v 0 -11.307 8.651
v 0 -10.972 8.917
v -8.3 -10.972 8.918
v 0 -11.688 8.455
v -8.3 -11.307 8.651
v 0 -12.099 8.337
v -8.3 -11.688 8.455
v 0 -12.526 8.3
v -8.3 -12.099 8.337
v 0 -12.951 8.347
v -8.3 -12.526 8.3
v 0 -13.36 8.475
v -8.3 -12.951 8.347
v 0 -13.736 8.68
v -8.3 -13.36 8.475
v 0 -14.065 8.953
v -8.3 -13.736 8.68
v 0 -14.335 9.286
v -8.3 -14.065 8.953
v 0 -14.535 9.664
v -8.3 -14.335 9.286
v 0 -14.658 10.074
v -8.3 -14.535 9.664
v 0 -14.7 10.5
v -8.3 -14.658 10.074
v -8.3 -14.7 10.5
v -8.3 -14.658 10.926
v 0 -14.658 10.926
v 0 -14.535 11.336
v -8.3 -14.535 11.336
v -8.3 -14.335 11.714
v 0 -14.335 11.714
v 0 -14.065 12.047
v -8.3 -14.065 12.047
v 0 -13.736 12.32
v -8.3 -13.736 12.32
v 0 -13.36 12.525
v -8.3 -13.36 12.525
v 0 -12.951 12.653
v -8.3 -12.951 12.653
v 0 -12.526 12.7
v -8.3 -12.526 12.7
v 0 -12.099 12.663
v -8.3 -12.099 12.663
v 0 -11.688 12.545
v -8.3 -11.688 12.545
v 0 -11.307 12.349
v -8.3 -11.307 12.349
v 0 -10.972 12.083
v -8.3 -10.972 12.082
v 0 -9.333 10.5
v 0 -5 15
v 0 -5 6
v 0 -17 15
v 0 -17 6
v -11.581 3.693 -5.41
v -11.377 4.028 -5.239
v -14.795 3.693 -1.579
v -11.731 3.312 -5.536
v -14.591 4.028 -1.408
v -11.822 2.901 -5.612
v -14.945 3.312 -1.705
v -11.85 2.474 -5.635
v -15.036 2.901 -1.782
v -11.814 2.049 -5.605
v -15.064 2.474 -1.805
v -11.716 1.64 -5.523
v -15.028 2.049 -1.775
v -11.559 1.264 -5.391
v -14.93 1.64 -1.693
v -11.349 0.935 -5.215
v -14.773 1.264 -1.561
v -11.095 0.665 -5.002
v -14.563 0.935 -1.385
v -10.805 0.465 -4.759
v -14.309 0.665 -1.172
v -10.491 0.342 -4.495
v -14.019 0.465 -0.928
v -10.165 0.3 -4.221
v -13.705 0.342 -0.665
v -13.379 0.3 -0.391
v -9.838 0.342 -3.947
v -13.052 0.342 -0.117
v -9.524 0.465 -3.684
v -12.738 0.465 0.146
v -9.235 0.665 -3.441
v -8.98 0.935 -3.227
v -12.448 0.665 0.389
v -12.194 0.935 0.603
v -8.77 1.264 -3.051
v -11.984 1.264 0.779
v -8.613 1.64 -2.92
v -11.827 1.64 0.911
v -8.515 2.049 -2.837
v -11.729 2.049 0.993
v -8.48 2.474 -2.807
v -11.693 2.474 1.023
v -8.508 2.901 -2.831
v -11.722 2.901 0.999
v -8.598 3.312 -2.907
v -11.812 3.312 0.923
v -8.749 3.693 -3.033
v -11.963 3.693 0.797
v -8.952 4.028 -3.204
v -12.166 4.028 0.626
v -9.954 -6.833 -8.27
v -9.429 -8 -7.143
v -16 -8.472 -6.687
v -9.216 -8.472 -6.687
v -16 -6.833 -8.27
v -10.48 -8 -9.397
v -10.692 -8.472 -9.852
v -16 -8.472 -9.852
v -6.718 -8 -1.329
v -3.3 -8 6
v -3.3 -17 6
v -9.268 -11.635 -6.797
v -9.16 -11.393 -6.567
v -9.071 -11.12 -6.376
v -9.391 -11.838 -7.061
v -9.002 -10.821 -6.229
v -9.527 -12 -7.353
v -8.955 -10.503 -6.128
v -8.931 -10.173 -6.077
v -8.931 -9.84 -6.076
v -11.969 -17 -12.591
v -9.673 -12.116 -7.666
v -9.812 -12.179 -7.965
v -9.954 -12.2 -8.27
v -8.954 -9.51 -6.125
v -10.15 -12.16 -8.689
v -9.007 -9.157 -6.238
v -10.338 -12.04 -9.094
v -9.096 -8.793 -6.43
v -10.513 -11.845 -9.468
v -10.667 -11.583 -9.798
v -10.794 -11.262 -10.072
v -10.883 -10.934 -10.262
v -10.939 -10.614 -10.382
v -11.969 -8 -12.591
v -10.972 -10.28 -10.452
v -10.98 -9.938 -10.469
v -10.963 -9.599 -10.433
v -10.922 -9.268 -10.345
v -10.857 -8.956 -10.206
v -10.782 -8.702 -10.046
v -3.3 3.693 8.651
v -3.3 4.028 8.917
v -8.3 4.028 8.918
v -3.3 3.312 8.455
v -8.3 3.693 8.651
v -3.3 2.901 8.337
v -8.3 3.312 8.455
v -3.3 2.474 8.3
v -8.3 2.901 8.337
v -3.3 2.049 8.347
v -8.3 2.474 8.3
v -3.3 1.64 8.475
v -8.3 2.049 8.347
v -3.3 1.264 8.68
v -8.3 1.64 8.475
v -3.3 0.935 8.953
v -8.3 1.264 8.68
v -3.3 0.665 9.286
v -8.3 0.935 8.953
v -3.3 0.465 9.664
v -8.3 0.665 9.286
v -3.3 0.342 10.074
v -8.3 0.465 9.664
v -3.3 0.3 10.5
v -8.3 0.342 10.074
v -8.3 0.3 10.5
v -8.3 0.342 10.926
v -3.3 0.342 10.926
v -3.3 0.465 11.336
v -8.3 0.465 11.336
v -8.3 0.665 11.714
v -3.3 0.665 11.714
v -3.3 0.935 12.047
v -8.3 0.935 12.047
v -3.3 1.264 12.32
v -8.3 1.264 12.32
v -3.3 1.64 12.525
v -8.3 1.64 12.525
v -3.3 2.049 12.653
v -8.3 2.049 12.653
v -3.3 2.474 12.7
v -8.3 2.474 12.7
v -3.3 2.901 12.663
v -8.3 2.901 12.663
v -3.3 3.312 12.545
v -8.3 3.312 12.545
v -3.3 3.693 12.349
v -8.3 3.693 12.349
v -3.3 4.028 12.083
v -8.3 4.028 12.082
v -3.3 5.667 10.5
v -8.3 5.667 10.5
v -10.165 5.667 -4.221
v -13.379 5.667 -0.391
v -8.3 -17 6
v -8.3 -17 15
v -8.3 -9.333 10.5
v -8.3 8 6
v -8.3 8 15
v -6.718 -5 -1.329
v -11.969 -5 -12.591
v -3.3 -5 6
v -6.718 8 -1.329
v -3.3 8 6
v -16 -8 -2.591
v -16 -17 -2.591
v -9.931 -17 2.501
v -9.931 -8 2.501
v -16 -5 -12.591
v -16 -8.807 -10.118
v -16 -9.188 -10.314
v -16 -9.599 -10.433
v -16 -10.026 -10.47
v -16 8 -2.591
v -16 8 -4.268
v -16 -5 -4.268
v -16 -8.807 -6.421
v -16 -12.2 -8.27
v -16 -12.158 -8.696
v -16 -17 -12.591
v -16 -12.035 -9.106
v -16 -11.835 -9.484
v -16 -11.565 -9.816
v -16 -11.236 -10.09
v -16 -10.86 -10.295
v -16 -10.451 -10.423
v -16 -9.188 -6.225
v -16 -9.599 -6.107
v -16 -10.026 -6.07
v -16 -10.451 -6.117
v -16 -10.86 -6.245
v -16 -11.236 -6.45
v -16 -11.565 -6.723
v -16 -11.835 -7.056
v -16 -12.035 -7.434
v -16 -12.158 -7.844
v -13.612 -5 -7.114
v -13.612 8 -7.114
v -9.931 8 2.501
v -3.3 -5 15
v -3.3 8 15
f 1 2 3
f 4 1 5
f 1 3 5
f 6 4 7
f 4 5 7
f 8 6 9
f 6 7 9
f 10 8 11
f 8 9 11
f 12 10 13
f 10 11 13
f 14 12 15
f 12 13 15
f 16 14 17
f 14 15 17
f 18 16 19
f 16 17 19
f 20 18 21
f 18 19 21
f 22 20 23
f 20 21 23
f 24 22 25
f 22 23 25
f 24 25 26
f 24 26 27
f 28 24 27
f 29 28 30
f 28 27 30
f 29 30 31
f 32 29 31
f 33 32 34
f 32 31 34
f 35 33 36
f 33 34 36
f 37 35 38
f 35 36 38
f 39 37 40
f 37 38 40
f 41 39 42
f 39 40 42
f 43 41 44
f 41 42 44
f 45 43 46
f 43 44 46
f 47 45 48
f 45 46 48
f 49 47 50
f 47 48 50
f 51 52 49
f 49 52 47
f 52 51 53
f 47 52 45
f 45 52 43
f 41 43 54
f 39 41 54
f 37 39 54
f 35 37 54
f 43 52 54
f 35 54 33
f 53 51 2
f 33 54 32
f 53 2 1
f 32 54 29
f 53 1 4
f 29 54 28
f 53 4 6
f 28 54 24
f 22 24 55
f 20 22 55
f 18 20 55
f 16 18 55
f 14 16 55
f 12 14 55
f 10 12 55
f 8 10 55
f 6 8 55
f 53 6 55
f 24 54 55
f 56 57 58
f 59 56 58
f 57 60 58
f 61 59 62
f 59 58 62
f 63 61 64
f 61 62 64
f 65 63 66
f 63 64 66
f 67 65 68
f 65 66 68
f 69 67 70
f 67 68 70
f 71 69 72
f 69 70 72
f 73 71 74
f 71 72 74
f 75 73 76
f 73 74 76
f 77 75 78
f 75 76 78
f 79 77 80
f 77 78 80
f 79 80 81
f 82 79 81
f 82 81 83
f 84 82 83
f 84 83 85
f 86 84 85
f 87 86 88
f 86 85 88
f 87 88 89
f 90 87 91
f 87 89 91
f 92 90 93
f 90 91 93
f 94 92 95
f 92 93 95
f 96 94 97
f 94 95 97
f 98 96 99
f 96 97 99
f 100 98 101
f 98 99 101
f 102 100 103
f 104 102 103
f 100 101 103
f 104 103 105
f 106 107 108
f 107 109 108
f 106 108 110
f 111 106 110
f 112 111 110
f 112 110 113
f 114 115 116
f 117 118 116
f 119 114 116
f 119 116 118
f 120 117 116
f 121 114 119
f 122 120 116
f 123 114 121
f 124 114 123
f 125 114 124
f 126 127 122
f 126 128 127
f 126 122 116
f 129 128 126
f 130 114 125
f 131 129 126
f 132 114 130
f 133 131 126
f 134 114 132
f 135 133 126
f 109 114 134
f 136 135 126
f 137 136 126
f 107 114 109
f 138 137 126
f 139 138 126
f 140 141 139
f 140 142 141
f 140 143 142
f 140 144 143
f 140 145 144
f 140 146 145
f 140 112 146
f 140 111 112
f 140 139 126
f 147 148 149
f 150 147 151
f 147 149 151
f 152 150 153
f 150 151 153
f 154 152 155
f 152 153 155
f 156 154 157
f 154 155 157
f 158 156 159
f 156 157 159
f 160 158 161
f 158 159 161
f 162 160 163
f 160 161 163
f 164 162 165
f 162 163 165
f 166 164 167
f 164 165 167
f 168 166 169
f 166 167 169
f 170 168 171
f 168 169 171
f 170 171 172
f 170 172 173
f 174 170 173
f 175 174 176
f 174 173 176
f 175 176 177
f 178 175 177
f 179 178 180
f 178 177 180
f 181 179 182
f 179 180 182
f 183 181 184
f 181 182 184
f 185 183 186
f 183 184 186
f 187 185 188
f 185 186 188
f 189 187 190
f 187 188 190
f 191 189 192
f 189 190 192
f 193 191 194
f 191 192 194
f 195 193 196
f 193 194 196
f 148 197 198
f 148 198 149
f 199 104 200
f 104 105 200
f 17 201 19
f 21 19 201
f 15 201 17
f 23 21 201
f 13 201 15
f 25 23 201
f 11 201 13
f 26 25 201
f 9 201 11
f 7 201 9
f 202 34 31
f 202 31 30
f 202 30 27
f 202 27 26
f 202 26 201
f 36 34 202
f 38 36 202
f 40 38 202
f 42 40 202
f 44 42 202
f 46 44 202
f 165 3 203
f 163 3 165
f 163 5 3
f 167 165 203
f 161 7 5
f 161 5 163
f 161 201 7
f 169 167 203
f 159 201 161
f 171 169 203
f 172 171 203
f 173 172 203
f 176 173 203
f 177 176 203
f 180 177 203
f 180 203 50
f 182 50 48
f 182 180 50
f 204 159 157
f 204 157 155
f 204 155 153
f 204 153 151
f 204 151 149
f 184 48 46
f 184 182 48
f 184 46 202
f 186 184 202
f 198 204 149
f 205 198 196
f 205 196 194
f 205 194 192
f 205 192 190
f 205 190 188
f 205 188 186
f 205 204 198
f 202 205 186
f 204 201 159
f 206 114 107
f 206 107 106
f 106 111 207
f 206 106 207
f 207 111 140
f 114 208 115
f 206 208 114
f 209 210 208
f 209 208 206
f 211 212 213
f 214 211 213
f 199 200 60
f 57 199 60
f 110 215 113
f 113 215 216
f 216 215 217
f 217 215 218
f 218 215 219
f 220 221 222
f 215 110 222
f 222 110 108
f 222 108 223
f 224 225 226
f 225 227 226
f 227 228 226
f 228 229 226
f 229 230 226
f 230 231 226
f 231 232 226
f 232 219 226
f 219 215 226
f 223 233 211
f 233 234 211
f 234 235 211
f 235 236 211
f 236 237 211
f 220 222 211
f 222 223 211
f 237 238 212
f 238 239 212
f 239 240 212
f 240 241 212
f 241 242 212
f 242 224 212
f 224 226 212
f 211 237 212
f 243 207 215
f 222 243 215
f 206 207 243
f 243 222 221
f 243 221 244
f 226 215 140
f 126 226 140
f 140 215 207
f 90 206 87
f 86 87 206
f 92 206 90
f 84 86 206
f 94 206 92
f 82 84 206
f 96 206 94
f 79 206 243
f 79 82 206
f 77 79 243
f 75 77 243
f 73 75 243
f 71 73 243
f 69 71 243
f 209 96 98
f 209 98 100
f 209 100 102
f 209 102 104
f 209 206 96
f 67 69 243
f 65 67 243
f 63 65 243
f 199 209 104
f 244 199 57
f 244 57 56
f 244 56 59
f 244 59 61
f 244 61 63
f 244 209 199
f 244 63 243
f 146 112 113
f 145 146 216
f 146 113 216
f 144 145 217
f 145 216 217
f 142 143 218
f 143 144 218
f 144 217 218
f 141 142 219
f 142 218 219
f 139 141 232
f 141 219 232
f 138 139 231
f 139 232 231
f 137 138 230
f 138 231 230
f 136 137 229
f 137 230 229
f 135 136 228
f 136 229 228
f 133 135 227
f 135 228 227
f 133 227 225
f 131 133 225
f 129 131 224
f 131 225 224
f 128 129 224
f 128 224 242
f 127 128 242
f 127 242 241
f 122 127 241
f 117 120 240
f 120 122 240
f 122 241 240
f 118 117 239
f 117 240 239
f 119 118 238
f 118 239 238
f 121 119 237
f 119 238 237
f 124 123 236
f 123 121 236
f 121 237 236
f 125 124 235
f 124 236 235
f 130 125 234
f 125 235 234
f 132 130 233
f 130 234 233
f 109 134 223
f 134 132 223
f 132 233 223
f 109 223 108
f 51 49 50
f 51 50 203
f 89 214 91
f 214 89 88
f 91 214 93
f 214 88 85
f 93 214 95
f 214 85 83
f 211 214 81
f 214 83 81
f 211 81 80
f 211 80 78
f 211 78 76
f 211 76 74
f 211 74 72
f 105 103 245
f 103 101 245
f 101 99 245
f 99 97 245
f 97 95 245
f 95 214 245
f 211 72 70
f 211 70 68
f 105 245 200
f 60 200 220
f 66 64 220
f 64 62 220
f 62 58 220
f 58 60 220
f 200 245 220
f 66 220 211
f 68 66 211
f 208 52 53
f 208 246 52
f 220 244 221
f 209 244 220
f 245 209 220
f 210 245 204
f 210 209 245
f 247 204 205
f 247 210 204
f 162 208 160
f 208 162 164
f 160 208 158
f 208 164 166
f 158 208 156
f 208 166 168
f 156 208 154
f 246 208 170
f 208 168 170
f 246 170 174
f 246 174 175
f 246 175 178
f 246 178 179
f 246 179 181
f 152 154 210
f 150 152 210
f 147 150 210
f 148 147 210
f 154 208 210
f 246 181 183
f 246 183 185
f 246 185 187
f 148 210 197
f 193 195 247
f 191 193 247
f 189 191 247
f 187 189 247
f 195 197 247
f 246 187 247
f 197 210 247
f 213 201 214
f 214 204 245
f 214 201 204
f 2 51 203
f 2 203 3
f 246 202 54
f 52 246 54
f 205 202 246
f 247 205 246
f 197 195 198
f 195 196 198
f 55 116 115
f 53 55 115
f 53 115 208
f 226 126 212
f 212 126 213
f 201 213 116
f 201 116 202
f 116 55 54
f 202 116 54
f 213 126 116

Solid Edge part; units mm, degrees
sketch "Sketch1" plane through (0, 0, 0) normal (0, -1, 0) x (1, 0, 0)
  line L0 (-8.3, 6) -> (-8.3, 15)
  line L1 (-8.3, 15) -> (-3.3, 15)
  line L2 (-3.3, 6) -> (-3.3, 15)
  line L3 (-3.3, 6) -> (-6.7175, -1.3288)
  line L4 (-6.7175, -1.3288) -> (-13.6119, -7.1139)
  line L5 (-16.8258, -3.2836) -> (-13.6119, -7.1139)
  line L6 (-9.9314, 2.5014) -> (-16.8258, -3.2836)
  line L7 (-8.3, 6) -> (-9.9314, 2.5014)
extrude "ExtrudedProtrusion_1" add sketch "Sketch1" along normal mid plane 16
sketch "Sketch2" plane through (0, -8, 0) normal (0, -1, 0) x (1, 0, 0)
  line L0 (-8.3, 15) -> (-3.3, 15)
  line L1 (-3.3, 6) -> (-3.3, 15)
  line L2 (-3.3, 6) -> (-11.969, -12.5907)
  line L3 (-16, -12.5907) -> (-11.969, -12.5907)
  line L4 (-16, -2.5907) -> (-16, -12.5907)
  line L5 (-16, -2.5907) -> (-9.9314, 2.5014)
  line L6 (-9.9314, 2.5014) -> (-8.3, 6)
  line L7 (-8.3, 6) -> (-8.3, 15)
extrude "Protrusion1" add sketch "Sketch2" along normal blind 9
sketch "Sketch3" plane through (-16, -11.5, 1.2046) normal (-1, 0, 0) x (0, -1, 0)
  circle A0 centre (-1.5, -9.4744) radius 2.2
  dimension "D1" = 7
extrude "Cutout1" cut sketch "Sketch3" against normal through all
sketch "Sketch4" plane through (-11.3587, -8, -6.9597) normal (0, 1, 0) x (0, 0, 1)
  line L0 (-5.631, -0.6103) -> (-5.631, -4.6413)
  line L1 (-5.631, -4.6413) -> (2.6919, -4.6413)
  line L2 (-0.1541, -2.2532) -> (2.6919, -4.6413)
  line L3 (5.631, 4.6412) -> (-0.1541, -2.2532)
  line L4 (5.631, 4.6412) -> (-5.631, -0.6103)
extrude "ExtrudedProtrusion_5" add sketch "Sketch4" along normal blind 3
sketch "Sketch5" plane through (-9.65, -17, 1.2046) normal (0, -1, 0) x (1, 0, 0)
  line L0 (-6.35, -13.7954) -> (-6.35, 13.7954)
extrude "Cutout2" cut sketch "Sketch5" against normal through all material side at (-16.05, -17, 1.2046)
sketch "Sketch6" plane through (-12.9657, -4.5, -0.0447) normal (-0.6427876, 0, 0.7660444) x (0.7660444, 0, 0.6427876)
  circle A0 centre (-0.539, 7) radius 2.2
  dimension "D1" = 5.5
extrude "Cutout3" cut sketch "Sketch6" against normal through all
sketch "Sketch7" plane through (-12.9657, -4.5, -0.0447) normal (-0.6427876, 0, 0.7660444) x (0.7660444, 0, 0.6427876)
  line L0 (-0.539, 7) -> (1.0435, 8.5282)
  line L1 (1.0435, 8.5282) -> (-0.539, 10.167)
  line L2 (-0.539, 10.167) -> (-2.1216, 8.5282)
  line L3 (-2.1216, 8.5282) -> (-0.539, 7)
extrude "Cutout4" cut sketch "Sketch7" against normal through all
sketch "Sketch8" plane through (-16, -4.5, -7.5907) normal (-1, 0, 0) x (0, 0, 1)
  line L0 (-0.6791, -5.5) -> (0.9035, -3.9718)
  line L1 (0.9035, -3.9718) -> (-0.6791, -2.333)
  line L2 (-0.6791, -2.333) -> (-2.2616, -3.9718)
  line L3 (-2.2616, -3.9718) -> (-0.6791, -5.5)
extrude "Cutout5" cut sketch "Sketch8" against normal through all
sketch "Sketch9" plane through (-3.3, -4.5, 10.5) normal (1, 0, 0) x (0, 0, -1)
  line L0 (4.5, -12.5) -> (-4.5, -12.5)
  line L1 (-4.5, -12.5) -> (-4.5, -0.5)
  line L2 (-4.5, -0.5) -> (4.5, -0.5)
  line L3 (4.5, -12.5) -> (4.5, -0.5)
  dimension "D1" = 12
extrude "ExtrudedProtrusion_4" add sketch "Sketch9" along normal blind 3.3
sketch "Sketch10" plane through (-8.3, -4.5, 10.5) normal (-1, 0, 0) x (0, 0, 1)
  circle A0 centre (0, 7) radius 2.2
  circle A1 centre (0, -8) radius 2.2
  dimension "D1" = 15
  dimension "D2" = 5.5
extrude "Cutout6" cut sketch "Sketch10" against normal through all
sketch "Sketch11" plane through (-8.3, -4.5, 10.5) normal (-1, 0, 0) x (0, 0, 1)
  line L0 (0, 7) -> (1.5825, 8.5282)
  line L1 (1.5825, 8.5282) -> (0, 10.167)
  line L2 (0, 10.167) -> (-1.5825, 8.5282)
  line L3 (-1.5825, 8.5282) -> (0, 7)
  line L4 (0, -8) -> (1.5825, -6.4718)
  line L5 (1.5825, -6.4718) -> (0, -4.833)
  line L6 (0, -4.833) -> (-1.5825, -6.4718)
  line L7 (-1.5825, -6.4718) -> (0, -8)
extrude "Cutout7" cut sketch "Sketch11" against normal through all
